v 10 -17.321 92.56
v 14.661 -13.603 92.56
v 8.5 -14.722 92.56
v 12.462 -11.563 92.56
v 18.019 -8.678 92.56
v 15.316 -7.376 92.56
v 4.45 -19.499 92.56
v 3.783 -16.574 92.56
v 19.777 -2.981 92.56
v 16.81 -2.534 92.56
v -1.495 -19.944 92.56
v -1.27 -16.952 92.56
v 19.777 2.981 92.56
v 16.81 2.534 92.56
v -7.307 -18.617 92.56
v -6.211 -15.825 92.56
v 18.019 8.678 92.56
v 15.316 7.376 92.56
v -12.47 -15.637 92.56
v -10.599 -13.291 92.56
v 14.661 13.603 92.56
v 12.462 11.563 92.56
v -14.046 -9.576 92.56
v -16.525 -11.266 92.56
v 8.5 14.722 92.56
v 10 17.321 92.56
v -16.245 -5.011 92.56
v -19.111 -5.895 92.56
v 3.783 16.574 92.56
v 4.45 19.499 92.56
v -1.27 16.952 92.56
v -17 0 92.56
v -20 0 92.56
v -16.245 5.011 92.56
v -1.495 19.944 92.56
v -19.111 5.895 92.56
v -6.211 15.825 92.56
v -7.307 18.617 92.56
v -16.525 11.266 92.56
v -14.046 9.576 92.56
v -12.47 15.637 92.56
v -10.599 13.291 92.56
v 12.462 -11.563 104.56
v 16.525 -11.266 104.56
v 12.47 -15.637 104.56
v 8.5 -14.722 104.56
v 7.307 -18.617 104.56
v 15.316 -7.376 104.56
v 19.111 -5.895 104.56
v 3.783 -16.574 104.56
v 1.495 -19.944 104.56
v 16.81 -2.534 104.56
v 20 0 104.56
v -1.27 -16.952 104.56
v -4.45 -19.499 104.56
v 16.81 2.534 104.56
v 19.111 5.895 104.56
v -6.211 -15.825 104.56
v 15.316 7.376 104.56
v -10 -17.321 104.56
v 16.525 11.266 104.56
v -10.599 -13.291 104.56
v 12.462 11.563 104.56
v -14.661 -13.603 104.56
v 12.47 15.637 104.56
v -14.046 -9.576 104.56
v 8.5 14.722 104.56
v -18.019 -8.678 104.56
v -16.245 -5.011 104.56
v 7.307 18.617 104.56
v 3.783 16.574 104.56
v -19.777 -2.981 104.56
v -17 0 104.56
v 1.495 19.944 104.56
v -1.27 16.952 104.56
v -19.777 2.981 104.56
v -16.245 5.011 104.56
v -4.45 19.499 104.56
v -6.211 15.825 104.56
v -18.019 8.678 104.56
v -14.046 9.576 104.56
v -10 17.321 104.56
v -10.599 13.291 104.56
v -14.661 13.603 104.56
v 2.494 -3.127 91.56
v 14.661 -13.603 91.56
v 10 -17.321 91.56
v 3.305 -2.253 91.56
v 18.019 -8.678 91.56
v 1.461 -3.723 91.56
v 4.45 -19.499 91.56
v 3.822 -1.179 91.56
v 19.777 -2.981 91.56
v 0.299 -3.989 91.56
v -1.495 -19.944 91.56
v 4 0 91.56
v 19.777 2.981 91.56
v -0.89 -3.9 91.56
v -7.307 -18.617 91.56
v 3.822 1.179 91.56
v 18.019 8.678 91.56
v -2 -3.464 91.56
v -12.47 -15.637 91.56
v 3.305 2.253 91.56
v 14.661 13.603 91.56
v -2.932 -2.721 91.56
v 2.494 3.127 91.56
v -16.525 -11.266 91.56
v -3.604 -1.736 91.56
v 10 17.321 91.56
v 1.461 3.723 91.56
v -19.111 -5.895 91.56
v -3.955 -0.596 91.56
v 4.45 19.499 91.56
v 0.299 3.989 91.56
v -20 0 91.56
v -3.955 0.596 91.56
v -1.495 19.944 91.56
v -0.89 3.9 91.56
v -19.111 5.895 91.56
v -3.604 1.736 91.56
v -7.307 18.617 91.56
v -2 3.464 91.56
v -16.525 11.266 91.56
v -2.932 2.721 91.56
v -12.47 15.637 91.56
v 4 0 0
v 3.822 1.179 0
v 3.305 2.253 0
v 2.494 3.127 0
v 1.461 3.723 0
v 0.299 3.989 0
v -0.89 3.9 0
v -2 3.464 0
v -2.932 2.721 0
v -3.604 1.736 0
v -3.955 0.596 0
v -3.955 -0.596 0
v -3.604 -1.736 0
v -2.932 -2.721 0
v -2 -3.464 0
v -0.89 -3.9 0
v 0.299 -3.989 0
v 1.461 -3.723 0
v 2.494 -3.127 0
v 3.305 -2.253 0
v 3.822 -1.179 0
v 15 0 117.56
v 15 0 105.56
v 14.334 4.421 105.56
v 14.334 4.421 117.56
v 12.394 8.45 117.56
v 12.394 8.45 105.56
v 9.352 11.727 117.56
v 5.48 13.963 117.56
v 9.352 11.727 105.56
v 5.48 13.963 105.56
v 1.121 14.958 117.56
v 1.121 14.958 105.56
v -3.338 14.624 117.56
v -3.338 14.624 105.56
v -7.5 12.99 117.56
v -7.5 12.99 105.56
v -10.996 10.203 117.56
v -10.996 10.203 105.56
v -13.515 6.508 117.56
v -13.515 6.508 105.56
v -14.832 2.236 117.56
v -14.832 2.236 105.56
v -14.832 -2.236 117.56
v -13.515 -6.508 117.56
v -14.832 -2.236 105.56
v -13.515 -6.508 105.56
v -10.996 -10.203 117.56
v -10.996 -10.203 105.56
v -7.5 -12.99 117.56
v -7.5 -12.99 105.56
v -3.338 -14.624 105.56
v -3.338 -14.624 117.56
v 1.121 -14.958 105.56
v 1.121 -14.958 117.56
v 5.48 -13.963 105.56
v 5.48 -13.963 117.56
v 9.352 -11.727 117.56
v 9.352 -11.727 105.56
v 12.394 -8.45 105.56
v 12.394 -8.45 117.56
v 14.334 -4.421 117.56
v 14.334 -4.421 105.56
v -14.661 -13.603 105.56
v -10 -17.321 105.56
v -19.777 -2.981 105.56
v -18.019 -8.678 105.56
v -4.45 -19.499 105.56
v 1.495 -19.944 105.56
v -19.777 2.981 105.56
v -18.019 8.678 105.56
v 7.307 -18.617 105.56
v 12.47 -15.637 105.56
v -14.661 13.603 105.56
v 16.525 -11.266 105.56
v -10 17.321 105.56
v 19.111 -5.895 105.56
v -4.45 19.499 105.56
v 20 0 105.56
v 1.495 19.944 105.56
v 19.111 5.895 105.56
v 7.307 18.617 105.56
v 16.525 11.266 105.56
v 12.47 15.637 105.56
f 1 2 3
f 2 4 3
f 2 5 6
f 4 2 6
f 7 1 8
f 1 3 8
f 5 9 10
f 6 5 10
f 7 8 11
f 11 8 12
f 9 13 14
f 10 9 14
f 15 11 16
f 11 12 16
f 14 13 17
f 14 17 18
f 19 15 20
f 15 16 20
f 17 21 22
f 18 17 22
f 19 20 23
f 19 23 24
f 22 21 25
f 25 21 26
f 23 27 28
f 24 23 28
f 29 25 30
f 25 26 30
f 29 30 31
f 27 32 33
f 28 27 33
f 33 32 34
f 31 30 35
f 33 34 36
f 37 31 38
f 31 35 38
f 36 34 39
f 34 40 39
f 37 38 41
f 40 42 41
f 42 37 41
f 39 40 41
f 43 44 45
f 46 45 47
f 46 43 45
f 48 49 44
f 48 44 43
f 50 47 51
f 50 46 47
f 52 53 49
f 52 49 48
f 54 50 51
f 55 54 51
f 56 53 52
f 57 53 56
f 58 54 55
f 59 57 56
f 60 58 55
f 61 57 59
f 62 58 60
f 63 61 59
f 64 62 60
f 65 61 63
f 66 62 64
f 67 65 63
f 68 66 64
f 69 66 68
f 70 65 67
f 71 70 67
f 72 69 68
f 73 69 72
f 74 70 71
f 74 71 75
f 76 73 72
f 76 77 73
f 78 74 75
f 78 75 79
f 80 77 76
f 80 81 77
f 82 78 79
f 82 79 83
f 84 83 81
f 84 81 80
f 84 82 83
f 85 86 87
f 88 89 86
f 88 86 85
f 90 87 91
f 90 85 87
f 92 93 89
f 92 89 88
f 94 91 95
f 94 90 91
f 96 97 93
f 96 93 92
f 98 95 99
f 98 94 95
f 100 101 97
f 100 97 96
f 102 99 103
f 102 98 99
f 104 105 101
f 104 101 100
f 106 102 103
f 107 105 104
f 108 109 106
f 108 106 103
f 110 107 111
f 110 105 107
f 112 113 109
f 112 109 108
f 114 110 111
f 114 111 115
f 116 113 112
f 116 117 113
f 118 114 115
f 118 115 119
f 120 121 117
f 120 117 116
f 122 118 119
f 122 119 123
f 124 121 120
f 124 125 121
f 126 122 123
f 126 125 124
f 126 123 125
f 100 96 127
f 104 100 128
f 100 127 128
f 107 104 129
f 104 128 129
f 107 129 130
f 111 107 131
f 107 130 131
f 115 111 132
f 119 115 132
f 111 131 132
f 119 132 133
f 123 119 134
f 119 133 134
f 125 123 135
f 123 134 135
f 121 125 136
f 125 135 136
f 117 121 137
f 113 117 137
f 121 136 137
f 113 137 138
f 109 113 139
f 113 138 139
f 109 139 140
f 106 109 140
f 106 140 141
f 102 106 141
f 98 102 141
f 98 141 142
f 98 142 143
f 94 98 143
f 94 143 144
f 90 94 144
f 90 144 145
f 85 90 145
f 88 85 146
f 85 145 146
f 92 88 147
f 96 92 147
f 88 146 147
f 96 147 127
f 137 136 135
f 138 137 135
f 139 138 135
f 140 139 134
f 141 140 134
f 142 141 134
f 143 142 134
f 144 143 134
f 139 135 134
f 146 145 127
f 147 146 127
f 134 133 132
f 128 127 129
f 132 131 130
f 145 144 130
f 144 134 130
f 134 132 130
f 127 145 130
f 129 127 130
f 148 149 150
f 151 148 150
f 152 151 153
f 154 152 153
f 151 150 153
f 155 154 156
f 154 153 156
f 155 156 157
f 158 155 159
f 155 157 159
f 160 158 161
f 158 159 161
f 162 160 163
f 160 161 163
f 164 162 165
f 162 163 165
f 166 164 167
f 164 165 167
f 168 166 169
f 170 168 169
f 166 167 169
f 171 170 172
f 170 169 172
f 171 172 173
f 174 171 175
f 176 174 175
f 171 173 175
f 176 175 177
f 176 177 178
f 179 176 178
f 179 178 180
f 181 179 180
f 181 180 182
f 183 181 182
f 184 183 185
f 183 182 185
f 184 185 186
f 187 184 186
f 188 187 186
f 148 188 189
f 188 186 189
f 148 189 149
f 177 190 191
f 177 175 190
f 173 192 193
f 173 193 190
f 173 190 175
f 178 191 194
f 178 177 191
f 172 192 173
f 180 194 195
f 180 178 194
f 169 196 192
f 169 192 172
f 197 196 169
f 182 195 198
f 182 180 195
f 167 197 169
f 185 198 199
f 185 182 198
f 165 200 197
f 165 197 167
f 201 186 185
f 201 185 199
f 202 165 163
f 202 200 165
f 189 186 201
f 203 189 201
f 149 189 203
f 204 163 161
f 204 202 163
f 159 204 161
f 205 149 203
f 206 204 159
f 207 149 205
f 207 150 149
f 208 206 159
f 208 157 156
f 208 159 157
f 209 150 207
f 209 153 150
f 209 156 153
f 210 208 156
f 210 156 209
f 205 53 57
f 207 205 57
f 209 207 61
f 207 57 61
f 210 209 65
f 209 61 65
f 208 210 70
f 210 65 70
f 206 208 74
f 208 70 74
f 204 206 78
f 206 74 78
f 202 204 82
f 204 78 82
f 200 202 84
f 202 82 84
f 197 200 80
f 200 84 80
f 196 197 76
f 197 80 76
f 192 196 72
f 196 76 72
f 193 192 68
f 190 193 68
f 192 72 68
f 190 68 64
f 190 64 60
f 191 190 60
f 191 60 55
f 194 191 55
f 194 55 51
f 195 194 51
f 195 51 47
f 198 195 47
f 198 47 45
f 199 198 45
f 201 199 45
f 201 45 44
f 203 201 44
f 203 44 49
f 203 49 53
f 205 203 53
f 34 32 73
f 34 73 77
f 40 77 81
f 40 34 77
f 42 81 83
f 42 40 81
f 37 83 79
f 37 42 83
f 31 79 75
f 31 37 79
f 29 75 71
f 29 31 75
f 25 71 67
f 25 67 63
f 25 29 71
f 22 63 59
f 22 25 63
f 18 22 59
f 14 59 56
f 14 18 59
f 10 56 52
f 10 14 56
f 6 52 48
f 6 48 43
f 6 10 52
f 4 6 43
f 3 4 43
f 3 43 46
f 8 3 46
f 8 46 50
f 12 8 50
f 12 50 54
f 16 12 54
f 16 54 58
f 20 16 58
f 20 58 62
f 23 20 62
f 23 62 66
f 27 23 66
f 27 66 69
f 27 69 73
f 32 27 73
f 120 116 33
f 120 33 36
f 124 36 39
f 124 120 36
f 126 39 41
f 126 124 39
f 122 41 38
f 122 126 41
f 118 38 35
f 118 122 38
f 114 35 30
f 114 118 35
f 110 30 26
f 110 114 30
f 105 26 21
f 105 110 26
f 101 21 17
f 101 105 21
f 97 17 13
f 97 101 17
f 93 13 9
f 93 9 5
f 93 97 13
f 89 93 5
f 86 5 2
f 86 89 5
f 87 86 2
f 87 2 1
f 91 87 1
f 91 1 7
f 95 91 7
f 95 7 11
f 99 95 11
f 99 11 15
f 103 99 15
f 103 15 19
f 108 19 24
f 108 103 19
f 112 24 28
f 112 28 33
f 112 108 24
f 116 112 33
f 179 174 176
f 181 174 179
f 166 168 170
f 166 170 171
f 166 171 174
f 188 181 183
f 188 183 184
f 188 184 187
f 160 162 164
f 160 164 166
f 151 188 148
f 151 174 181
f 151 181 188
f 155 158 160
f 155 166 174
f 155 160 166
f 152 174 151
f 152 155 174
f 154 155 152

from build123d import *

# Parameters (mm, degrees)
SKETCH_1_R          = 4
EXTRUDE_1_DEPTH     = 91.56
SKETCH_2_R          = 20
EXTRUDE_2_DEPTH     = 14
SKETCH_3_R          = 15
EXTRUDE_3_DEPTH     = 12
SKETCH_4_R          = 20
SKETCH_4_R_2        = 17
CUT_EXTRUDE_1_DEPTH = 13
SKETCH_5_R          = 20
EXTRUDE_4_DEPTH     = 1


with BuildPart() as part:
    # 草图1 → 凸台-拉伸1 (new body)
    with BuildSketch(Plane.XY):
        Circle(SKETCH_1_R)
    extrude(amount=EXTRUDE_1_DEPTH)

    # 草图2 → 凸台-拉伸2 (add)
    with BuildSketch(Plane.XY.offset(91.56)):
        Circle(SKETCH_2_R)
    extrude(amount=EXTRUDE_2_DEPTH)

    # 草图3 → 凸台-拉伸3 (add)
    with BuildSketch(Plane.XY.offset(105.56)):
        Circle(SKETCH_3_R)
    extrude(amount=EXTRUDE_3_DEPTH)

    # 草图4 → 切除-拉伸1 (cut)
    with BuildSketch(Plane(origin=(0, 0, 91.56), x_dir=(-1, 0, 0), z_dir=(0, 0, -1))):
        Circle(SKETCH_4_R)
        Circle(SKETCH_4_R_2, mode=Mode.SUBTRACT)
    extrude(amount=-CUT_EXTRUDE_1_DEPTH, mode=Mode.SUBTRACT)

    # 草图5 → 凸台-拉伸4 (add)
    with BuildSketch(Plane(origin=(0, 0, 91.56), x_dir=(-1, 0, 0), z_dir=(0, 0, -1))):
        Circle(SKETCH_5_R)
    extrude(amount=-EXTRUDE_4_DEPTH)


solid = part.part
